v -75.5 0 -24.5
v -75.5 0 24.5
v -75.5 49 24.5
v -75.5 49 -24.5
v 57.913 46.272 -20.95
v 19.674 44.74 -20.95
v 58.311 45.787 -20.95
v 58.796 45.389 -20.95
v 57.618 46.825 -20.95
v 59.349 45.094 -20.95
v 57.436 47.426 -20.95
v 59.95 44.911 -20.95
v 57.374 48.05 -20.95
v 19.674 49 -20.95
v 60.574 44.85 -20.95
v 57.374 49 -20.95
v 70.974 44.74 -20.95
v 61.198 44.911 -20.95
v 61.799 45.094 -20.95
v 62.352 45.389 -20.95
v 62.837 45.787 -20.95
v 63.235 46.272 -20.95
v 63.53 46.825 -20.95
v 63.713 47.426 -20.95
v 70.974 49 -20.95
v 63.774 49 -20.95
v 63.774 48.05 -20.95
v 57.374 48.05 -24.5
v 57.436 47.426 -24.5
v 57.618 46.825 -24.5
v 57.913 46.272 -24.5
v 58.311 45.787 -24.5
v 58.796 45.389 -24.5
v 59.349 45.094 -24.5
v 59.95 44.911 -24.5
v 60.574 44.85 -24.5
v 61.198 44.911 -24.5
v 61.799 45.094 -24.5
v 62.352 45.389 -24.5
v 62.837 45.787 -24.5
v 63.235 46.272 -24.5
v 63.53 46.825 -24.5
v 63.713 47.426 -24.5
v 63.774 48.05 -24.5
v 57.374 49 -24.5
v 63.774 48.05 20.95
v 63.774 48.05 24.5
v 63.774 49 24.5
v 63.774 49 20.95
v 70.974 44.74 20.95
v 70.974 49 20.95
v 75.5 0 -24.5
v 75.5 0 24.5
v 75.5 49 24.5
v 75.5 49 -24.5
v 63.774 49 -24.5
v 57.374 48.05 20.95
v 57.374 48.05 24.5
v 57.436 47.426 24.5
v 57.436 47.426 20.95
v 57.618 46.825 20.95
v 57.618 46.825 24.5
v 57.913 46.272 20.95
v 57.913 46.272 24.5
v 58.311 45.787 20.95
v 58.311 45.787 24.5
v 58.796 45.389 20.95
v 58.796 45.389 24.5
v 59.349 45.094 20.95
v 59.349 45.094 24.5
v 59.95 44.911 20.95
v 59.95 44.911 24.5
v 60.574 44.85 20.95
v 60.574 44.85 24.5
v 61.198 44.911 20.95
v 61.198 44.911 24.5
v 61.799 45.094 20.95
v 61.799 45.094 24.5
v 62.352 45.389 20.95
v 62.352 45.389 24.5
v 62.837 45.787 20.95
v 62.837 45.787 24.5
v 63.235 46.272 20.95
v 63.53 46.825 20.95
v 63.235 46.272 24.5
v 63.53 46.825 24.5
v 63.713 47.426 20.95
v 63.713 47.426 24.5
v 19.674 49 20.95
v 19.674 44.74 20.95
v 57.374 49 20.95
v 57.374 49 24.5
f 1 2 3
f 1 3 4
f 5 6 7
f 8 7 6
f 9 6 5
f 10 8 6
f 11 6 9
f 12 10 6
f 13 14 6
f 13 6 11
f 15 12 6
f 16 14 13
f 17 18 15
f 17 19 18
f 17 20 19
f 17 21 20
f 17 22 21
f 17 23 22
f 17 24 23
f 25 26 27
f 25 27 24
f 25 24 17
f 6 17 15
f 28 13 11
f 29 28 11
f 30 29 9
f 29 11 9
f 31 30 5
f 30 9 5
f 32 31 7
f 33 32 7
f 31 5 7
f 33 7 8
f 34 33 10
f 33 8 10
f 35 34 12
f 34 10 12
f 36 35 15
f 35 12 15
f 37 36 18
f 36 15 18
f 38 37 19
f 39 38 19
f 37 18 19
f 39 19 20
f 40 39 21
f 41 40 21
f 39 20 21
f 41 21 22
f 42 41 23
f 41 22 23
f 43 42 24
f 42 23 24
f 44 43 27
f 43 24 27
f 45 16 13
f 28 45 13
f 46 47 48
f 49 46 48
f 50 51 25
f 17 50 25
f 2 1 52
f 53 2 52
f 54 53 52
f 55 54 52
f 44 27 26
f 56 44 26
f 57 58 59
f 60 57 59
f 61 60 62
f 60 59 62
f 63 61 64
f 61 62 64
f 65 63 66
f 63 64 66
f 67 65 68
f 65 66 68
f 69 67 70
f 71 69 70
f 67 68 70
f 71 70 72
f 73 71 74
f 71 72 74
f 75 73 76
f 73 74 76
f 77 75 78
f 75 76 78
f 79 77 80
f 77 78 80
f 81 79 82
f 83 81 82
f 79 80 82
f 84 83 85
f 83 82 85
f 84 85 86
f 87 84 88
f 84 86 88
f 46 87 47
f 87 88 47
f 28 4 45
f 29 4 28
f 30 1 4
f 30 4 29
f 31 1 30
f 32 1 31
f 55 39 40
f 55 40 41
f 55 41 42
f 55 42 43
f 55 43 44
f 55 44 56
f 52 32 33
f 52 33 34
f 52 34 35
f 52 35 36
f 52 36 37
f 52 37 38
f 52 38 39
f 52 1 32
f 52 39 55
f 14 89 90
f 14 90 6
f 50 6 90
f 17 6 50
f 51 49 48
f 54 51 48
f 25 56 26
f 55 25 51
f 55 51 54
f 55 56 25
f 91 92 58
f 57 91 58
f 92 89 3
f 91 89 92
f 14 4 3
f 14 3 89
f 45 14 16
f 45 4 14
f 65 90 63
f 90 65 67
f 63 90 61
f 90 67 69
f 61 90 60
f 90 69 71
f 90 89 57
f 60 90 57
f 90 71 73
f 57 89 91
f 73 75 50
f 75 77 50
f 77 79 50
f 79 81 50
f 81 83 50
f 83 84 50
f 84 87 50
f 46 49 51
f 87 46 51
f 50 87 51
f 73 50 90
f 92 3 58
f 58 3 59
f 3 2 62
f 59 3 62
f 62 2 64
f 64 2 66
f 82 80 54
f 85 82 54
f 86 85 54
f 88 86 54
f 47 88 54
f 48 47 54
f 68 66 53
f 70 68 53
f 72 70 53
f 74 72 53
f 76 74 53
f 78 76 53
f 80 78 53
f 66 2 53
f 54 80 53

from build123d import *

# Parameters (mm, degrees)
SKETCH1_W               = 151
SKETCH1_H               = 49
BOSS_EXTRUDE1_DEPTH     = 49
SKETCH2_W               = 51.3
SKETCH2_H               = 41.9
CUT_EXTRUDE1_DEPTH      = 4.2596
CUT_EXTRUDE2_DEPTH      = 103.480485947
CUT_EXTRUDE2_DEPTH_BACK = 103.480485947


with BuildPart() as part:
    # Sketch1 → Boss-Extrude1 (new body)
    with BuildSketch(Plane(origin=(0, 0, 0), x_dir=(1, 0, 0), z_dir=(0, 1, 0))):
        Rectangle(SKETCH1_W, SKETCH1_H)
    extrude(amount=BOSS_EXTRUDE1_DEPTH)

    # Sketch2 → Cut-Extrude1 (cut)
    with BuildSketch(Plane(origin=(0, 49, 0), x_dir=(1, 0, 0), z_dir=(0, 1, 0))):
        with Locations((45.324412799, 0)):
            Rectangle(SKETCH2_W, SKETCH2_H)
    extrude(amount=-CUT_EXTRUDE1_DEPTH, mode=Mode.SUBTRACT)

    # Sketch6 → Cut-Extrude2 (cut, two sides: drawn at the far end of the back side and taken through both)
    with BuildSketch(Plane(origin=(0, 0, -24.5), x_dir=(-1, 0, 0), z_dir=(0, 0, -1)).offset(-CUT_EXTRUDE2_DEPTH_BACK)):
        with BuildLine():
            Line((-63.774014365, 48.05), (-63.774014365, 49))
            ThreePointArc((-63.774014365, 49), (-60.574014365, 52.2), (-57.374014365, 49))
            Line((-57.374014365, 49), (-57.374014365, 48.05))
            ThreePointArc((-57.374014365, 48.05), (-60.574014365, 44.85), (-63.774014365, 48.05))
        make_face()
    extrude(amount=CUT_EXTRUDE2_DEPTH + CUT_EXTRUDE2_DEPTH_BACK, mode=Mode.SUBTRACT)


solid = part.part
